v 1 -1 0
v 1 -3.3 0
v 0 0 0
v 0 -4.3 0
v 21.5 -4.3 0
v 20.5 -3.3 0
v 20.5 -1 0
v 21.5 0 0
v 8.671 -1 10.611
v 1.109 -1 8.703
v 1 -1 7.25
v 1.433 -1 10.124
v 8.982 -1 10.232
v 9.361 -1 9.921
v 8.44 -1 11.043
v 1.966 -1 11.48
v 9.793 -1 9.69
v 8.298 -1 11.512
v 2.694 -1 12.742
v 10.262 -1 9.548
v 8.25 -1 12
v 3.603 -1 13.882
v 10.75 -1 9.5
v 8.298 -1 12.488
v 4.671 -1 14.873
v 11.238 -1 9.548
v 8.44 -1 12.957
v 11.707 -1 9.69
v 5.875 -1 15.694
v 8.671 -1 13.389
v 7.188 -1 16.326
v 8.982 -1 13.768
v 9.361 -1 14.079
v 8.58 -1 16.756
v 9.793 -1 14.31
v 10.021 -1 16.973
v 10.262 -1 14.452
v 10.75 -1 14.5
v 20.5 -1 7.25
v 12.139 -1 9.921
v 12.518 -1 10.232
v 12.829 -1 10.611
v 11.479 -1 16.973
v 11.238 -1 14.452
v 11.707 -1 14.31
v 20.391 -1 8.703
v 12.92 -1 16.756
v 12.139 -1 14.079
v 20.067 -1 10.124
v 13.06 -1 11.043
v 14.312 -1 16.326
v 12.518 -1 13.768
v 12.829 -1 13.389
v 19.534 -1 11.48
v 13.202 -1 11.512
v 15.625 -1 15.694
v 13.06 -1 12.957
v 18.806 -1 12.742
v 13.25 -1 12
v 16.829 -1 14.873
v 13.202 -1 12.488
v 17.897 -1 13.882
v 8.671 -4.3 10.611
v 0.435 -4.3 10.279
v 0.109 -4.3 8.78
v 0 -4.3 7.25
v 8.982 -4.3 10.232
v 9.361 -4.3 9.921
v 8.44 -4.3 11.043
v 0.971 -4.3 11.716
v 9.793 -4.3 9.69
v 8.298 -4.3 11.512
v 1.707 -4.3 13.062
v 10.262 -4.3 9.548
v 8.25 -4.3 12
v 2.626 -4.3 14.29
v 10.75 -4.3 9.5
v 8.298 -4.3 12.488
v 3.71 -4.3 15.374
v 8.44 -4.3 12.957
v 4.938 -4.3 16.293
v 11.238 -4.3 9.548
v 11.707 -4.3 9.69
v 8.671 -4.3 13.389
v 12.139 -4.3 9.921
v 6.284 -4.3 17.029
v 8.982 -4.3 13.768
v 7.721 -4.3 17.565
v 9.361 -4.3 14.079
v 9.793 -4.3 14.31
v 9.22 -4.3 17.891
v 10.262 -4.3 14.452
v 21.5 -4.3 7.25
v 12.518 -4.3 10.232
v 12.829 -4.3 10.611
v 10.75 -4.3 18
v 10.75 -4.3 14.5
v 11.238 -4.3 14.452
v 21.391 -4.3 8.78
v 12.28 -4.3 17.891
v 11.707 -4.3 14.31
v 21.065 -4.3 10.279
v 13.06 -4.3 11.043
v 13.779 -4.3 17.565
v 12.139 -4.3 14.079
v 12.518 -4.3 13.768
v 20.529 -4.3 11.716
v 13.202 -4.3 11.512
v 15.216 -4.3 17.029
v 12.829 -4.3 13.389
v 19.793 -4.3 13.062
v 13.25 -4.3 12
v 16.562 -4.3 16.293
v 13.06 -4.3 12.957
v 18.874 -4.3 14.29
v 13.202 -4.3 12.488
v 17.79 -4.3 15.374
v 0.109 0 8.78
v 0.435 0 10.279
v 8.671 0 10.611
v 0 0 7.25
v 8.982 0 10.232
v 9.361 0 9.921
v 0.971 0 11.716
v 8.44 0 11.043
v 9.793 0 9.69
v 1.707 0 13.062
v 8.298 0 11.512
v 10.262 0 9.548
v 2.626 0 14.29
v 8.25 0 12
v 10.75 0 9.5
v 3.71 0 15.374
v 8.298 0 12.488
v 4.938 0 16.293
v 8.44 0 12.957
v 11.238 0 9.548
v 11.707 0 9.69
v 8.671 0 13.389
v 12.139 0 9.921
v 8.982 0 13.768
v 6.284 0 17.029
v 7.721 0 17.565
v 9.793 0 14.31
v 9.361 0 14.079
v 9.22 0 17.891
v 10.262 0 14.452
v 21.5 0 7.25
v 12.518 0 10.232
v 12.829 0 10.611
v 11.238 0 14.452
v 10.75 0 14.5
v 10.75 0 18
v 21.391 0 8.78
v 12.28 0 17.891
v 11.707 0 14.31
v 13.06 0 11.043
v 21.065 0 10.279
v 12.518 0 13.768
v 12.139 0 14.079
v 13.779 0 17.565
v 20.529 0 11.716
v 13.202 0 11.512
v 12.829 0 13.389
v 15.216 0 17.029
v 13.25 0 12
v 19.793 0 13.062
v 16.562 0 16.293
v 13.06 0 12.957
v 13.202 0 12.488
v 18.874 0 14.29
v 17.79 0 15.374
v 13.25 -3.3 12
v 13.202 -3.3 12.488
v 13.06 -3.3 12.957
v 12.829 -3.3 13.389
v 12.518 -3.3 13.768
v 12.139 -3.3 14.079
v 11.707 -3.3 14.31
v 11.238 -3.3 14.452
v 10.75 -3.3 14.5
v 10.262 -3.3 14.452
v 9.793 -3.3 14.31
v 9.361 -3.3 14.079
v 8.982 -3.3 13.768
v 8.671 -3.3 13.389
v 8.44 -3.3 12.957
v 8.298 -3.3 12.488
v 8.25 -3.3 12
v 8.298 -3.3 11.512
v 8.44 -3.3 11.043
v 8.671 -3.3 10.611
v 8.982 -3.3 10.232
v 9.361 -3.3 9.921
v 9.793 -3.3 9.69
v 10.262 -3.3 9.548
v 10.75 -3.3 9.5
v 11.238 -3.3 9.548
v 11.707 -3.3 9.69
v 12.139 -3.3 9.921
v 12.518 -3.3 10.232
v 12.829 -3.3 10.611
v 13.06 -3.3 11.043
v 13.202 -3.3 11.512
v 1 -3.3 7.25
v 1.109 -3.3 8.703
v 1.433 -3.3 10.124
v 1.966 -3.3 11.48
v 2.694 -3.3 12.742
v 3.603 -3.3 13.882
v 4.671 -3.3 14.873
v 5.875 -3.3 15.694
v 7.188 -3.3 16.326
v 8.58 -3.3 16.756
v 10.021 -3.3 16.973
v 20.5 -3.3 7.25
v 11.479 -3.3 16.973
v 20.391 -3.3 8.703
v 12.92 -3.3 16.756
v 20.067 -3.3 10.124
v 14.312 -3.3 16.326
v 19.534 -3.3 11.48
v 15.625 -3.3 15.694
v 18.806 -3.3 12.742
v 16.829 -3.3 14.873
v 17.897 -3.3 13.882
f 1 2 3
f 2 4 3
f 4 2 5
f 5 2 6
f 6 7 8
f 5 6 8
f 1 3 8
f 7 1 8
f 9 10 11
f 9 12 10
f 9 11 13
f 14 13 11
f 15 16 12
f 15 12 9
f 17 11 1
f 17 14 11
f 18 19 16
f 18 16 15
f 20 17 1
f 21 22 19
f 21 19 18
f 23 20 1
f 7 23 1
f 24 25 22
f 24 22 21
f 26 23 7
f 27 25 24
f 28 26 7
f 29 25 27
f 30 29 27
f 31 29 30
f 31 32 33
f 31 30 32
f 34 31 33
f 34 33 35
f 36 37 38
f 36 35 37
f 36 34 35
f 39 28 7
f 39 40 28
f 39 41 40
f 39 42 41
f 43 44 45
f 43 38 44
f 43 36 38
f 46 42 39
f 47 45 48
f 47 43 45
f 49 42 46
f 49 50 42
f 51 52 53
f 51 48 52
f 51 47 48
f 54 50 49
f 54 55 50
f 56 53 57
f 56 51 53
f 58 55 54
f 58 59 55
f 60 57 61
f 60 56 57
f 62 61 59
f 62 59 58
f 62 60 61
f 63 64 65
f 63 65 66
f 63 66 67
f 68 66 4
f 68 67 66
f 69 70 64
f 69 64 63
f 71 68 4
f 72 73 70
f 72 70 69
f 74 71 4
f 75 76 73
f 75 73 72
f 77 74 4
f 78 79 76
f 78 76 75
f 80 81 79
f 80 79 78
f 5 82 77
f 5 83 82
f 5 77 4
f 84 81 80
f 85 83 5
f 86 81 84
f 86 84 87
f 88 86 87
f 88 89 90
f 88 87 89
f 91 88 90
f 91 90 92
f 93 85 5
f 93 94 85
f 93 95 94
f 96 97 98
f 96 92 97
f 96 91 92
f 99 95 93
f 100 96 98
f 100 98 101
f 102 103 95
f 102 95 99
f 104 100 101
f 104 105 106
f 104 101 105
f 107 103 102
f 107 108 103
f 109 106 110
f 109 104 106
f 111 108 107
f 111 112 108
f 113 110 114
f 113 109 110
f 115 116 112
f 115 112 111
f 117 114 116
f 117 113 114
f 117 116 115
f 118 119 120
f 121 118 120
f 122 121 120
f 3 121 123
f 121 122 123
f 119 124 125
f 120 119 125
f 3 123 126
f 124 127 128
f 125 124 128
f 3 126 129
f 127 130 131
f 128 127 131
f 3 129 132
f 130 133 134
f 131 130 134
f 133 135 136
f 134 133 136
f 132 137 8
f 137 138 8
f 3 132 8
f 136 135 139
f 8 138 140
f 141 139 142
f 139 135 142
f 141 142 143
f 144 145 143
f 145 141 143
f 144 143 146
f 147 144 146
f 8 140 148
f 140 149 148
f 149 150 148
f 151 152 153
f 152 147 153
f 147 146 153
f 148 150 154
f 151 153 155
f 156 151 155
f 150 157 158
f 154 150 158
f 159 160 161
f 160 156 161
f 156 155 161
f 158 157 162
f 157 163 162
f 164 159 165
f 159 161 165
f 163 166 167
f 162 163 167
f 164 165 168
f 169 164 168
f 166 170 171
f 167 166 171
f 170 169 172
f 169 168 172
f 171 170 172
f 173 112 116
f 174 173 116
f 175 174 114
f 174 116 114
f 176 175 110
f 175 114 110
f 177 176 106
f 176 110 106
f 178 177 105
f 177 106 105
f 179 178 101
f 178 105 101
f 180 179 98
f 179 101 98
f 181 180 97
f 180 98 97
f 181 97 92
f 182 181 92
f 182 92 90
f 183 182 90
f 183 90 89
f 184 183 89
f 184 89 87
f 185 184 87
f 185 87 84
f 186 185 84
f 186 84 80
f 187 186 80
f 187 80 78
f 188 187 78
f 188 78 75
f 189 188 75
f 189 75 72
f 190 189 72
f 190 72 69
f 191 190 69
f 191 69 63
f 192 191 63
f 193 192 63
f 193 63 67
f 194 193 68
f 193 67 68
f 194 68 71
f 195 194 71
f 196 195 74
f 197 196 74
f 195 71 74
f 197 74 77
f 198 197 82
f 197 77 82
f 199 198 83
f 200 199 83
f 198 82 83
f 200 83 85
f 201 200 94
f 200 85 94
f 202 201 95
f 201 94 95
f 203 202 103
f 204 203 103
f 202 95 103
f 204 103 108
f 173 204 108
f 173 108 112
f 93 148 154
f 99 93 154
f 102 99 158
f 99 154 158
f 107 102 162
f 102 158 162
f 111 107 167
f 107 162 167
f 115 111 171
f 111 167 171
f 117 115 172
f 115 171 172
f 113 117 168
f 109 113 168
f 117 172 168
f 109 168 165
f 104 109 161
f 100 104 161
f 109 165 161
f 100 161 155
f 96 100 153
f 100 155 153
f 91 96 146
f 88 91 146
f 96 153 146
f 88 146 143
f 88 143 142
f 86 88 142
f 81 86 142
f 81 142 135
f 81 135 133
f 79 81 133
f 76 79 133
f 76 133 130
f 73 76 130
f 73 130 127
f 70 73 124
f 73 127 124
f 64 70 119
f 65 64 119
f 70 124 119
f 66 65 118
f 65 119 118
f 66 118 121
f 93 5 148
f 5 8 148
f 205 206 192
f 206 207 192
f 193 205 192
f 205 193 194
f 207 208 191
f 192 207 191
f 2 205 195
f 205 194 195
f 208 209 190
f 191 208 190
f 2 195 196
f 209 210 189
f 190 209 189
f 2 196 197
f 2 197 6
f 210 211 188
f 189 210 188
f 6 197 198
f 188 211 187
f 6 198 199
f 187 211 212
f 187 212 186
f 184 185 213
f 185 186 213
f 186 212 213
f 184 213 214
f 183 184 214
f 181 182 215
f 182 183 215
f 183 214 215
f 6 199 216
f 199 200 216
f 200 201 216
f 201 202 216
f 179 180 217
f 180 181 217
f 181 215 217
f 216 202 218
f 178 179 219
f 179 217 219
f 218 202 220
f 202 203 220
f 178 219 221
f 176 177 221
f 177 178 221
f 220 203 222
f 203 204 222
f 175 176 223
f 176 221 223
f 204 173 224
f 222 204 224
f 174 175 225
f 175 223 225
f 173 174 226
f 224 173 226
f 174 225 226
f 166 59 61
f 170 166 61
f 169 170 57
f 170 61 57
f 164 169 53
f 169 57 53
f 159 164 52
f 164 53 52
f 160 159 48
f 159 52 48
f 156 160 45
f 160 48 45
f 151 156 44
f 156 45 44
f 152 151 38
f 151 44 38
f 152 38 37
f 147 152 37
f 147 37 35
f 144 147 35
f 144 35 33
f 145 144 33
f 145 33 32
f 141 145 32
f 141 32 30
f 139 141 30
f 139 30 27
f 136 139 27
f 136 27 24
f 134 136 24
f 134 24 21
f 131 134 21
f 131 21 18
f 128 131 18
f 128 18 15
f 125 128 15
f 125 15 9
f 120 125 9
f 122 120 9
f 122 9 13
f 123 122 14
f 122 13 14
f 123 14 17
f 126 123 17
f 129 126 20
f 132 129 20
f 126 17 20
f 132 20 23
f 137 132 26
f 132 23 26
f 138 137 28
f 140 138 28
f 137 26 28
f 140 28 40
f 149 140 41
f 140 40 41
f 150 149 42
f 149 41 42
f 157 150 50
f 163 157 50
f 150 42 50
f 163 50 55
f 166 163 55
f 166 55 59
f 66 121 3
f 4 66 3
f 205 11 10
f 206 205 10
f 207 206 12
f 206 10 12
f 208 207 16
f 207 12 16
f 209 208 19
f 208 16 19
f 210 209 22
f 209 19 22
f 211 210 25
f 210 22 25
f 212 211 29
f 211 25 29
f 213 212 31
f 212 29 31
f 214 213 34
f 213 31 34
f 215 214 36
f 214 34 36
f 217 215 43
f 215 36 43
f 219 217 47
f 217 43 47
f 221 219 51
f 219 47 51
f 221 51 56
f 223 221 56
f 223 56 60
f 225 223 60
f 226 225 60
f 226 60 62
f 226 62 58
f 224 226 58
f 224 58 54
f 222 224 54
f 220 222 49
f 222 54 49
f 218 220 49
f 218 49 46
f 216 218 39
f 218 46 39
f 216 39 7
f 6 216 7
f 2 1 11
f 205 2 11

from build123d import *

# Parameters (mm, degrees)
F0_W     = 21.5
F0_H     = 7.25
F1_DEPTH = 1
F3_DEPTH = 2.3
F5_DEPTH = 1
F6_R     = 2.5
F7_DEPTH = 4.301


with BuildPart() as f1:
    # F0 (on Front) → F1 (new body)
    with BuildSketch(Plane.XZ):
        with Locations((10.75, 3.625)):
            Rectangle(F0_W, F0_H)
        with BuildLine():
            ThreePointArc((21.5, 7.25), (10.75, 18), (0, 7.25))
            Line((0, 7.25), (21.5, 7.25))
        make_face()
    extrude(amount=F1_DEPTH)

    # F2 (on face) → F3 (join)
    with BuildSketch(Plane.XZ.offset(1)):
        with BuildLine():
            Line((20.5, 7.25), (20.5, 0))
            Line((20.5, 0), (21.5, 0))
            Line((21.5, 0), (21.5, 7.25))
            ThreePointArc((21.5, 7.25), (10.75, 18), (0, 7.25))
            Line((0, 7.25), (0, 0))
            Line((0, 0), (1, 0))
            Line((1, 0), (1, 7.25))
            ThreePointArc((1, 7.25), (10.75, 17), (20.5, 7.25))
        make_face()
    extrude(amount=F3_DEPTH)

    # F4 (on face) → F5 (join)
    with BuildSketch(Plane.XZ.offset(3.3)):
        with BuildLine():
            Line((0, 7.25), (0, 0))
            Line((0, 0), (21.5, 0))
            Line((21.5, 0), (21.5, 7.25))
            ThreePointArc((21.5, 7.25), (10.75, 18), (0, 7.25))
        make_face()
    extrude(amount=F5_DEPTH)

    # F6 (on face) → F7 (cut, through all)
    with BuildSketch(Plane.XZ.offset(4.3)):
        with Locations((10.75, 12)):
            Circle(F6_R)
    extrude(amount=-F7_DEPTH, mode=Mode.SUBTRACT)


solid = f1.part
